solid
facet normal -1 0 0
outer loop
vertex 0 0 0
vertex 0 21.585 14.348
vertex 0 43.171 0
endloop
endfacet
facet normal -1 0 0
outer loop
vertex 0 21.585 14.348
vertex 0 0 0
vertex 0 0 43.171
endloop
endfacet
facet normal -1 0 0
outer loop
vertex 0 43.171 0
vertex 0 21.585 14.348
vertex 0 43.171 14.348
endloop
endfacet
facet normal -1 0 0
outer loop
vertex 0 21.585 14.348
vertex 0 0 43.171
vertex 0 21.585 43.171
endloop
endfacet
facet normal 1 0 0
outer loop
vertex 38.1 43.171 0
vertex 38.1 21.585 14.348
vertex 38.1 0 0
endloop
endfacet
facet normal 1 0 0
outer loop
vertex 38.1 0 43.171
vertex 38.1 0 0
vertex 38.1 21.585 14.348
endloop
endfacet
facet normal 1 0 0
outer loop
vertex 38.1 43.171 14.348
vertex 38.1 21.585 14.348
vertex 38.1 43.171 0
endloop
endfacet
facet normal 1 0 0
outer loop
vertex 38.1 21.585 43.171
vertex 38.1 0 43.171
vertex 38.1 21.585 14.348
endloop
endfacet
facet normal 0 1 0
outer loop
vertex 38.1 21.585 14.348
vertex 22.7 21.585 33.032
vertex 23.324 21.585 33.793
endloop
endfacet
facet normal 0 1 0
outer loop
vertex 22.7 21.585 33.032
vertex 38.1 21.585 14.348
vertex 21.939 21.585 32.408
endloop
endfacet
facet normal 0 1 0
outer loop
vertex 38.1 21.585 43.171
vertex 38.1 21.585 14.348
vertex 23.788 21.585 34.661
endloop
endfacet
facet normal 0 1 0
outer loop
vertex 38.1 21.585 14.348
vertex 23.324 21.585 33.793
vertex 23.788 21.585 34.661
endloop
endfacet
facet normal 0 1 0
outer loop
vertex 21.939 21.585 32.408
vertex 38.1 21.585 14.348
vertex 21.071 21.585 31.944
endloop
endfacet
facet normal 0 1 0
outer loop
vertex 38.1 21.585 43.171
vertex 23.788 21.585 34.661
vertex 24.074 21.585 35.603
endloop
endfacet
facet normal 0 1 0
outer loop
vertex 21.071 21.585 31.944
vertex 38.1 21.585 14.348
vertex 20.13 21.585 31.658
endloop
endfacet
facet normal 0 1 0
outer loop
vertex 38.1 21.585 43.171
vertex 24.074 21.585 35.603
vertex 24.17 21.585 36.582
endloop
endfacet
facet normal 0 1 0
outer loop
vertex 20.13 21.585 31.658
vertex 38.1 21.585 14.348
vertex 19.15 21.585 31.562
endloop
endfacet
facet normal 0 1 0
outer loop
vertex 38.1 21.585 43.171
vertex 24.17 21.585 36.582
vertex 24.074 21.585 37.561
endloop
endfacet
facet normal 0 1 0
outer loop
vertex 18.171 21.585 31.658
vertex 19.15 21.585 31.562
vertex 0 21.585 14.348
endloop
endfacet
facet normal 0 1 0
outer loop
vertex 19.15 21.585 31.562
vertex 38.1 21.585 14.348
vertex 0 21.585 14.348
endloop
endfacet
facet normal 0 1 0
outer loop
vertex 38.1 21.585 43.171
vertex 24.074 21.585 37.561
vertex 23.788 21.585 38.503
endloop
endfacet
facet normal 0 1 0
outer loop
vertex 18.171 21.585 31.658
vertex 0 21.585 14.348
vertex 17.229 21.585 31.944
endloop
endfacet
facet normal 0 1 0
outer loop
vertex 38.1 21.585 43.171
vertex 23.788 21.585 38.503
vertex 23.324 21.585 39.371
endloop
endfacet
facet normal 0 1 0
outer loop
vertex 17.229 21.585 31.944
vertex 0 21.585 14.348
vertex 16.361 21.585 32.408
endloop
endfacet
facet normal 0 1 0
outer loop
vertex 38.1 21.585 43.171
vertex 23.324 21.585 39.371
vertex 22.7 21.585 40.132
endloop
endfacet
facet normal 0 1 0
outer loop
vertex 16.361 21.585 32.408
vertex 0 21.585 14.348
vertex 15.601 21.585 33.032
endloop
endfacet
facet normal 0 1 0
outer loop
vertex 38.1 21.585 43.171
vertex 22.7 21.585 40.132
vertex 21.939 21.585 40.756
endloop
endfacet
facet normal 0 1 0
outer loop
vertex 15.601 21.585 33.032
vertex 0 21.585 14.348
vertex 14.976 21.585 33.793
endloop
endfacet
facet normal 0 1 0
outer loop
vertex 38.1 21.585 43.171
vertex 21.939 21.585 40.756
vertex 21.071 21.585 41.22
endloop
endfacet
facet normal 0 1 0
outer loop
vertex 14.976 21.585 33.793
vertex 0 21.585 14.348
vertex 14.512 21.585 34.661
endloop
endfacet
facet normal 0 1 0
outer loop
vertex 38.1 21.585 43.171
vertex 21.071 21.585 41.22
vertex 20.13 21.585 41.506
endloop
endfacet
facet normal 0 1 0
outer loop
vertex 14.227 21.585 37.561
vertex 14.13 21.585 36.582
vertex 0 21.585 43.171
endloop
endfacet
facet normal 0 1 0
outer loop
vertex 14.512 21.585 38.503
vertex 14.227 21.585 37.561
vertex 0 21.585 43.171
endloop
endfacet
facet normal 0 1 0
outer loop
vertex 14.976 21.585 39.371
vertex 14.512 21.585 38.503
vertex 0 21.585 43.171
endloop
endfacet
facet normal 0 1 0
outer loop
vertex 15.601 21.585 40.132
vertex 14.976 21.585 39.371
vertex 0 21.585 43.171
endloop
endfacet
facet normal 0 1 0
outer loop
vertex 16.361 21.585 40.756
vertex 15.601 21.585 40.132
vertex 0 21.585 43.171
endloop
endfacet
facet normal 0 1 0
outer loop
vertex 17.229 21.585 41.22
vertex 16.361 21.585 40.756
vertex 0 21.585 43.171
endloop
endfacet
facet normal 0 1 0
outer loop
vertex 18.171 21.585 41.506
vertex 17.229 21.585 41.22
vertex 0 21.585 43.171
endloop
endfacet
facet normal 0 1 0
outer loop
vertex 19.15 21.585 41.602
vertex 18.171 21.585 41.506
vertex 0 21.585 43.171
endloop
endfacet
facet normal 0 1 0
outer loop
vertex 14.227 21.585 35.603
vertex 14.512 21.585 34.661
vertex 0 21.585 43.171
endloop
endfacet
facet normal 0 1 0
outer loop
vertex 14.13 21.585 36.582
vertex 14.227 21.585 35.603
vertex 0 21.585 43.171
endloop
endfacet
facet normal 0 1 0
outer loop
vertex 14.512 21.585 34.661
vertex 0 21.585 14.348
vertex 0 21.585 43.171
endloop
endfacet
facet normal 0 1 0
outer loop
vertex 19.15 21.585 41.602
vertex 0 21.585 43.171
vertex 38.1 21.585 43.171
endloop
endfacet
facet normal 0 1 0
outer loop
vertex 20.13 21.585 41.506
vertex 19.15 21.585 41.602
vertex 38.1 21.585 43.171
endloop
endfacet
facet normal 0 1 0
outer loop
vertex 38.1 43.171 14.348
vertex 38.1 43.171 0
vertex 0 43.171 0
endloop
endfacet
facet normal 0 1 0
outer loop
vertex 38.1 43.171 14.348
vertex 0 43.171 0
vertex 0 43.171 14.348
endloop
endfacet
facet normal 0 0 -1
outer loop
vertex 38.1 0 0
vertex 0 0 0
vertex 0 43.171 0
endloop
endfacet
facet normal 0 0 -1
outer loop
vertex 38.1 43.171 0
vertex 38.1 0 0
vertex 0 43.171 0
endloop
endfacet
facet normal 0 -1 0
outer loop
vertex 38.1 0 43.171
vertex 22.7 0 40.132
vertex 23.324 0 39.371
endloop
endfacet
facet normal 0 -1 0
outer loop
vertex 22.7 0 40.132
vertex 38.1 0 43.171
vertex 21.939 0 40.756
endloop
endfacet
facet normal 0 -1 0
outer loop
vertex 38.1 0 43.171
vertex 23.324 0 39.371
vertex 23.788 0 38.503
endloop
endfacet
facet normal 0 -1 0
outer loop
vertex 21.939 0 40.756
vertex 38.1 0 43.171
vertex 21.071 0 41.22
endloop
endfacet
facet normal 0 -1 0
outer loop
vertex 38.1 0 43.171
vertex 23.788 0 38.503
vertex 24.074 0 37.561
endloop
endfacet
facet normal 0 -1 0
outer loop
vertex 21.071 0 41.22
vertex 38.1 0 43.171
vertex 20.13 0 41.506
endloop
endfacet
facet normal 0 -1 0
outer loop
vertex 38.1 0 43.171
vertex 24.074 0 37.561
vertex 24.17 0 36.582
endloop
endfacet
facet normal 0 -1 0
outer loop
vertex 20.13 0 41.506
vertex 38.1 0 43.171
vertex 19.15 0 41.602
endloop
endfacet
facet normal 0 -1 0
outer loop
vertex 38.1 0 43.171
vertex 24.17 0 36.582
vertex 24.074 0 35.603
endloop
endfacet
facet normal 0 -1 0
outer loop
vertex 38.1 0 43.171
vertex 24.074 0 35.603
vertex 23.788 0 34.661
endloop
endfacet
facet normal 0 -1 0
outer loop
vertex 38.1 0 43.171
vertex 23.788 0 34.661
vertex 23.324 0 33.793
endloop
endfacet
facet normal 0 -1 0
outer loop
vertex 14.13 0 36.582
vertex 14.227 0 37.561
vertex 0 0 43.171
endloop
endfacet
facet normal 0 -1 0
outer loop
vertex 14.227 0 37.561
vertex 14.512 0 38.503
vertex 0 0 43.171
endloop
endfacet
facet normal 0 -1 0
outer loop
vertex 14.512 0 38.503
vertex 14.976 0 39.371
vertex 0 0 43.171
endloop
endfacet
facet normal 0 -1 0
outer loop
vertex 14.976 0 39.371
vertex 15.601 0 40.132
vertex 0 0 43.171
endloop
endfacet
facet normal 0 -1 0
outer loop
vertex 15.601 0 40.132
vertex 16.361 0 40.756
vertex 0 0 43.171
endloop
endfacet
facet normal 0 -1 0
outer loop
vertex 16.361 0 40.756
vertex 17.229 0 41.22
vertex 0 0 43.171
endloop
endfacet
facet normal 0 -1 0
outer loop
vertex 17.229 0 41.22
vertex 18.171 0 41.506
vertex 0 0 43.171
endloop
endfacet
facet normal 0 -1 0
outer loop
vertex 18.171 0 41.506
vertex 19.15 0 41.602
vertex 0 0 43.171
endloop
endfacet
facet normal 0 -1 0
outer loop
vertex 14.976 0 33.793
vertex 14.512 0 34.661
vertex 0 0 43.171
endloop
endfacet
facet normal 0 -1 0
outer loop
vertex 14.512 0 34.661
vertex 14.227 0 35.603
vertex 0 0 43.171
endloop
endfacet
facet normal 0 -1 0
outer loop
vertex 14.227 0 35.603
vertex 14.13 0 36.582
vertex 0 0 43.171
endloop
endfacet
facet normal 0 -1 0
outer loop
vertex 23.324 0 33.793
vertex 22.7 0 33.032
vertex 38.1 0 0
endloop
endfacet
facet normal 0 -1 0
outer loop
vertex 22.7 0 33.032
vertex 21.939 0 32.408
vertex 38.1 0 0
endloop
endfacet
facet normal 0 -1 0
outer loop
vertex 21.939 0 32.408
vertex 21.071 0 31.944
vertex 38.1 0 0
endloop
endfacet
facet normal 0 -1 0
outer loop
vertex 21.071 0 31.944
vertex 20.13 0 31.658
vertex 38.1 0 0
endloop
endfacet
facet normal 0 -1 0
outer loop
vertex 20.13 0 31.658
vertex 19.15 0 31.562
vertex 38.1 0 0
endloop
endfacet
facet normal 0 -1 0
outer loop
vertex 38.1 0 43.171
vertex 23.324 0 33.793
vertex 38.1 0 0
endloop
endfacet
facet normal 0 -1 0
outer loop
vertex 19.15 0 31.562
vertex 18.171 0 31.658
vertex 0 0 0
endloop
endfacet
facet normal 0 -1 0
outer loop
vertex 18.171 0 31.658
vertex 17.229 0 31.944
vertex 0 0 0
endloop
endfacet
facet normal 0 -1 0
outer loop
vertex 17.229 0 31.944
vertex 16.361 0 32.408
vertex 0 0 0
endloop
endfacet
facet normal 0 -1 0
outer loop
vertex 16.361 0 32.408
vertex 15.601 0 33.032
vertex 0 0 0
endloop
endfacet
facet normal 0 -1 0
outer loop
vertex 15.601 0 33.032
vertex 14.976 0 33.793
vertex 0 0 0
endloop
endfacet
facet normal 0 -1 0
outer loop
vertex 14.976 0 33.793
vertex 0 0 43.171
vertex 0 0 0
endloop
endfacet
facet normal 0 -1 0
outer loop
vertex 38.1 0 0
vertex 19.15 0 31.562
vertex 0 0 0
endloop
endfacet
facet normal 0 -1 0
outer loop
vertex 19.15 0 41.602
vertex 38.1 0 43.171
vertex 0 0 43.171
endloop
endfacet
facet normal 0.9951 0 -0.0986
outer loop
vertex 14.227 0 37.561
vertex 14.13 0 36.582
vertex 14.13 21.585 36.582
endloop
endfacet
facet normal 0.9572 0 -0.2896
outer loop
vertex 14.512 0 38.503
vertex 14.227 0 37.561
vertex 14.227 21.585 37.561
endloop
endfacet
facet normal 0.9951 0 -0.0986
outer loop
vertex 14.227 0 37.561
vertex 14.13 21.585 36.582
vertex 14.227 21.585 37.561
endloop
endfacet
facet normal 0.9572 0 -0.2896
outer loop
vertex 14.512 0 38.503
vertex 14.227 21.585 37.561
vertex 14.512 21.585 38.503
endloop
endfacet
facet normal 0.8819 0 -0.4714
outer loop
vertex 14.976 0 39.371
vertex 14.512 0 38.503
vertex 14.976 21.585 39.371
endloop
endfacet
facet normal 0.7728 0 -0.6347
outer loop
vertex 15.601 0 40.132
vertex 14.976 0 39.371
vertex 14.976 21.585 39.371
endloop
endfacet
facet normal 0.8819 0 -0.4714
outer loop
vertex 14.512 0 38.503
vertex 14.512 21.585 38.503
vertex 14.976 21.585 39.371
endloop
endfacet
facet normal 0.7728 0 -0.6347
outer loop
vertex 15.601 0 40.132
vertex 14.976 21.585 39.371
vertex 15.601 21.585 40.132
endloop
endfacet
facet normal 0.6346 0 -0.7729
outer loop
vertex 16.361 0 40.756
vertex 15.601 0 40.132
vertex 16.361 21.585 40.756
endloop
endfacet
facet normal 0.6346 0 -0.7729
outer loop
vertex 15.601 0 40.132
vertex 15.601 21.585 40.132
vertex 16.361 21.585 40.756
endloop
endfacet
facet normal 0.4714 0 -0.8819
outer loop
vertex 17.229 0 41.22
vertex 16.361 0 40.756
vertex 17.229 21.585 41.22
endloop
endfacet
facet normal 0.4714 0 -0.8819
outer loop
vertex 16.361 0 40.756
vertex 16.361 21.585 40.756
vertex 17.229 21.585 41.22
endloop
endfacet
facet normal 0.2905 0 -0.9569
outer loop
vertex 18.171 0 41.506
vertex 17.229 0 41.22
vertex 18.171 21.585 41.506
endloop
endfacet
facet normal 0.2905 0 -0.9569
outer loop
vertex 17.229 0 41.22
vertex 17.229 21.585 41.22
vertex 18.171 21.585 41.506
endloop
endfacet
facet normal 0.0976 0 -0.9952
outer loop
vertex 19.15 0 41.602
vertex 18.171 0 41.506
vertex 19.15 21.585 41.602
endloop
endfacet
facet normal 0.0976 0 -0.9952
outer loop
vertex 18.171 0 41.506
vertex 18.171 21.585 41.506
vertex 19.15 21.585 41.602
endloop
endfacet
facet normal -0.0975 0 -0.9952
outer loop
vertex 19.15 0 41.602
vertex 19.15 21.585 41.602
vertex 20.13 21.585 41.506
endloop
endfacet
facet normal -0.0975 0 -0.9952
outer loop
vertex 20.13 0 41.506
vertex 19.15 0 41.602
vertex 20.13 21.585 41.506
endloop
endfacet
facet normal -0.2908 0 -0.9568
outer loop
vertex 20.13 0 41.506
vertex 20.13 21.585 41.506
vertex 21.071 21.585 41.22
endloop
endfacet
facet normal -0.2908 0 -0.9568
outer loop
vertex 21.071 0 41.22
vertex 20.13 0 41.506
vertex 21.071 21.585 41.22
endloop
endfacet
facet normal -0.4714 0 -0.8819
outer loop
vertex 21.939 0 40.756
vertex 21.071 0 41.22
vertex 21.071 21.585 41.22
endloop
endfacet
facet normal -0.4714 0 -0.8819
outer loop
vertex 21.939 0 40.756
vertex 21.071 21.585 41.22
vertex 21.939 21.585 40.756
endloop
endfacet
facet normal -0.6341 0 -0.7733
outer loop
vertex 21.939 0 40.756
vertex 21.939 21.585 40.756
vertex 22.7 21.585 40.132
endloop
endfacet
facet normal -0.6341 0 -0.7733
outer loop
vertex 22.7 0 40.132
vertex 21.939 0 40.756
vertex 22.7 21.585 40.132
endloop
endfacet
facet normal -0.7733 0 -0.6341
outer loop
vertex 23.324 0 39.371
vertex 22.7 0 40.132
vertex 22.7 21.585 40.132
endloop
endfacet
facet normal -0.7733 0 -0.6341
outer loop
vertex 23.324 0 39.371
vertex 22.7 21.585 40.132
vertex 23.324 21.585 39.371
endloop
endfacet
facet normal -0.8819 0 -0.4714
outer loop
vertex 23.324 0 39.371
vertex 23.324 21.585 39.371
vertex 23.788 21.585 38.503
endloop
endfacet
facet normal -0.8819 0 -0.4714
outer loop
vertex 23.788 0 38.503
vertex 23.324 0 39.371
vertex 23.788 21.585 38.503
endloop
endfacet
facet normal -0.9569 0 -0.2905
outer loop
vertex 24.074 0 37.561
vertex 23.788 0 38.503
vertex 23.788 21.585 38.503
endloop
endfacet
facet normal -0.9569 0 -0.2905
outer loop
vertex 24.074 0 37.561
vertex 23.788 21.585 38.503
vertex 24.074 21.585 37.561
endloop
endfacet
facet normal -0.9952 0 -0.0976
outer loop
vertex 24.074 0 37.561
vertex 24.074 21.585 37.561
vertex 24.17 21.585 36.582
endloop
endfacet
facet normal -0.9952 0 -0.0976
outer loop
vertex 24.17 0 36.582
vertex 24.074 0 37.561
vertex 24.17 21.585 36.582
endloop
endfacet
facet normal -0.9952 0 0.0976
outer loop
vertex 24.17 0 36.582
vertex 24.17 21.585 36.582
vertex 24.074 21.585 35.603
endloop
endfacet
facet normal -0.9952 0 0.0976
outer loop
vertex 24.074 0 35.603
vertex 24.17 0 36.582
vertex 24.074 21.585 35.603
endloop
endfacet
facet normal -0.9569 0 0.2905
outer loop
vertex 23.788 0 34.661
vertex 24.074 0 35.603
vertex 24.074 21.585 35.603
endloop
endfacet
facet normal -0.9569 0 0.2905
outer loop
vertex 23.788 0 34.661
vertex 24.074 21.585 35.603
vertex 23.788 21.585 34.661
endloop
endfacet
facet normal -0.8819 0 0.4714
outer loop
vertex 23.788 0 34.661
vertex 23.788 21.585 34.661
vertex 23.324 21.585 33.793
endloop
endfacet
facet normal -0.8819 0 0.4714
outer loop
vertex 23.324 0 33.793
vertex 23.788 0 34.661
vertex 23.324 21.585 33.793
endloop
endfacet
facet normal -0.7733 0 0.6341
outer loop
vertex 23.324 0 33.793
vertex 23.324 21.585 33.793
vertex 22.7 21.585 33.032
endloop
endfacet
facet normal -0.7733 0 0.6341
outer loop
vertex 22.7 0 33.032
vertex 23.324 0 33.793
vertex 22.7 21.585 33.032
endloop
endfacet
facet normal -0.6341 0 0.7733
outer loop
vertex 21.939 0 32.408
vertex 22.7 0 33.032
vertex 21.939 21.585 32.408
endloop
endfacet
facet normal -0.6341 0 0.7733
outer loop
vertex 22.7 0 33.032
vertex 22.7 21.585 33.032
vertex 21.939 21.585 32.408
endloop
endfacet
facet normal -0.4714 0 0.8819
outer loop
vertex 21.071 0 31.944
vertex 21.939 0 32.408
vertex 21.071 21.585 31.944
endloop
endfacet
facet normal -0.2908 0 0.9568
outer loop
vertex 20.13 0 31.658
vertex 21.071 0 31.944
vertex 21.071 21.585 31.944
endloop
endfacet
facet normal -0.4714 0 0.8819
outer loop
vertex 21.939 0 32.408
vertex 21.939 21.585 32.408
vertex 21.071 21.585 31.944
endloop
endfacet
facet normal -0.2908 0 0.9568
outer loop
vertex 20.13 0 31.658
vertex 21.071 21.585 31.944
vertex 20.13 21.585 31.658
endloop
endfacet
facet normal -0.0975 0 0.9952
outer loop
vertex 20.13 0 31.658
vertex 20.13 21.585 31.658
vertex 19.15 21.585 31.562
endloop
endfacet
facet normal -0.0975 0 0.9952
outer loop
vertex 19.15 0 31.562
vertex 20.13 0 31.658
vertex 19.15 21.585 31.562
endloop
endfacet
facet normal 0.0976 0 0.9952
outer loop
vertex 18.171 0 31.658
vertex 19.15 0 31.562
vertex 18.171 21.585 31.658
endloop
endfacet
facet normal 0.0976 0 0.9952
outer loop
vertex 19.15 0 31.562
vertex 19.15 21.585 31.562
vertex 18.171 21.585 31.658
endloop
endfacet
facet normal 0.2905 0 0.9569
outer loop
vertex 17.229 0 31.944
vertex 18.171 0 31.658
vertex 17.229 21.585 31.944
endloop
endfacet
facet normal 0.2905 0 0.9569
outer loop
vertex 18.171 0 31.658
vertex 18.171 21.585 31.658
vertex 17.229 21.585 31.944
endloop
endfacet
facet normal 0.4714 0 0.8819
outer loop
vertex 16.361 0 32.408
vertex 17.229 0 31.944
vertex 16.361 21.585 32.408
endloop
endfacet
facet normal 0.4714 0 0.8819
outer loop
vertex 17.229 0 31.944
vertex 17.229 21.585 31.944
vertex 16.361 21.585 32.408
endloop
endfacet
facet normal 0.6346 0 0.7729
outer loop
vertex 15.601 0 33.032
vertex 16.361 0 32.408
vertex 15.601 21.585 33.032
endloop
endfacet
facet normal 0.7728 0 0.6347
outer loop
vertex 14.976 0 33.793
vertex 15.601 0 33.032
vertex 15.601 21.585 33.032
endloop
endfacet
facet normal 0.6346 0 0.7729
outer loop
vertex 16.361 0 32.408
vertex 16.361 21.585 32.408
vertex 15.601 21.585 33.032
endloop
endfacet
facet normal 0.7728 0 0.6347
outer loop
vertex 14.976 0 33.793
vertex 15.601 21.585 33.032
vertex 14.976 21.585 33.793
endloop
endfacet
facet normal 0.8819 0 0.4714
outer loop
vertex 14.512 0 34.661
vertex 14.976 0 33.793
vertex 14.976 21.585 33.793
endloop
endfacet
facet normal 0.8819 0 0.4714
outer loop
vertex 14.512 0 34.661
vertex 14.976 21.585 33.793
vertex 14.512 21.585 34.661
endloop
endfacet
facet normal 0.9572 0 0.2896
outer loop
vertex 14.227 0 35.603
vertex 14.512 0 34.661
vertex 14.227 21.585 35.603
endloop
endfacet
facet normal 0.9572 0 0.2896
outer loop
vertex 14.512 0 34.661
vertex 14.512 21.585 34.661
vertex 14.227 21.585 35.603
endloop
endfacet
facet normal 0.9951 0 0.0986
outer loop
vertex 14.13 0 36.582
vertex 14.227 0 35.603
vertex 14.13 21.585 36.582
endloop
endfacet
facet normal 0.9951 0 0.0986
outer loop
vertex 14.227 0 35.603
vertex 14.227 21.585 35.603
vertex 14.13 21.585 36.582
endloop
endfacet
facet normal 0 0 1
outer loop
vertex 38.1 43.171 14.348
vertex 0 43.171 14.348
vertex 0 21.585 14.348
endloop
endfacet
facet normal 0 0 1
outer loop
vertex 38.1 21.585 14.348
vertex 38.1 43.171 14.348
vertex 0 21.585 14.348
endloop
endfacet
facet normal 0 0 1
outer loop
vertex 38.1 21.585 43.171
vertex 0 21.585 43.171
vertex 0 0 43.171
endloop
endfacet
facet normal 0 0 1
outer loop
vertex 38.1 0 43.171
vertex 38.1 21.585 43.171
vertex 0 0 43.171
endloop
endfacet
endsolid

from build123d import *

# Parameters (mm, degrees)
F1_DEPTH = 38.1
F2_R     = 5.020129
F3_DEPTH = 24.13


with BuildPart() as f1:
    # F0 (on Right) → F1 (new body)
    with BuildSketch(Plane.YZ):
        Polygon((21.585431, 43.170862), (0, 43.170862), (0, 0), (43.170862, 0), (43.170862, 14.348196), (21.585431, 14.348196), align=None)
    extrude(amount=F1_DEPTH)

    # F2 (on face) → F3 (cut)
    with BuildSketch(Plane(origin=(0, 21.585431, 0), x_dir=(-1, 0, 0), z_dir=(0, 1, 0))):
        with Locations((-19.150337, 36.581956)):
            Circle(F2_R)
    extrude(amount=-F3_DEPTH, mode=Mode.SUBTRACT)


solid = f1.part
